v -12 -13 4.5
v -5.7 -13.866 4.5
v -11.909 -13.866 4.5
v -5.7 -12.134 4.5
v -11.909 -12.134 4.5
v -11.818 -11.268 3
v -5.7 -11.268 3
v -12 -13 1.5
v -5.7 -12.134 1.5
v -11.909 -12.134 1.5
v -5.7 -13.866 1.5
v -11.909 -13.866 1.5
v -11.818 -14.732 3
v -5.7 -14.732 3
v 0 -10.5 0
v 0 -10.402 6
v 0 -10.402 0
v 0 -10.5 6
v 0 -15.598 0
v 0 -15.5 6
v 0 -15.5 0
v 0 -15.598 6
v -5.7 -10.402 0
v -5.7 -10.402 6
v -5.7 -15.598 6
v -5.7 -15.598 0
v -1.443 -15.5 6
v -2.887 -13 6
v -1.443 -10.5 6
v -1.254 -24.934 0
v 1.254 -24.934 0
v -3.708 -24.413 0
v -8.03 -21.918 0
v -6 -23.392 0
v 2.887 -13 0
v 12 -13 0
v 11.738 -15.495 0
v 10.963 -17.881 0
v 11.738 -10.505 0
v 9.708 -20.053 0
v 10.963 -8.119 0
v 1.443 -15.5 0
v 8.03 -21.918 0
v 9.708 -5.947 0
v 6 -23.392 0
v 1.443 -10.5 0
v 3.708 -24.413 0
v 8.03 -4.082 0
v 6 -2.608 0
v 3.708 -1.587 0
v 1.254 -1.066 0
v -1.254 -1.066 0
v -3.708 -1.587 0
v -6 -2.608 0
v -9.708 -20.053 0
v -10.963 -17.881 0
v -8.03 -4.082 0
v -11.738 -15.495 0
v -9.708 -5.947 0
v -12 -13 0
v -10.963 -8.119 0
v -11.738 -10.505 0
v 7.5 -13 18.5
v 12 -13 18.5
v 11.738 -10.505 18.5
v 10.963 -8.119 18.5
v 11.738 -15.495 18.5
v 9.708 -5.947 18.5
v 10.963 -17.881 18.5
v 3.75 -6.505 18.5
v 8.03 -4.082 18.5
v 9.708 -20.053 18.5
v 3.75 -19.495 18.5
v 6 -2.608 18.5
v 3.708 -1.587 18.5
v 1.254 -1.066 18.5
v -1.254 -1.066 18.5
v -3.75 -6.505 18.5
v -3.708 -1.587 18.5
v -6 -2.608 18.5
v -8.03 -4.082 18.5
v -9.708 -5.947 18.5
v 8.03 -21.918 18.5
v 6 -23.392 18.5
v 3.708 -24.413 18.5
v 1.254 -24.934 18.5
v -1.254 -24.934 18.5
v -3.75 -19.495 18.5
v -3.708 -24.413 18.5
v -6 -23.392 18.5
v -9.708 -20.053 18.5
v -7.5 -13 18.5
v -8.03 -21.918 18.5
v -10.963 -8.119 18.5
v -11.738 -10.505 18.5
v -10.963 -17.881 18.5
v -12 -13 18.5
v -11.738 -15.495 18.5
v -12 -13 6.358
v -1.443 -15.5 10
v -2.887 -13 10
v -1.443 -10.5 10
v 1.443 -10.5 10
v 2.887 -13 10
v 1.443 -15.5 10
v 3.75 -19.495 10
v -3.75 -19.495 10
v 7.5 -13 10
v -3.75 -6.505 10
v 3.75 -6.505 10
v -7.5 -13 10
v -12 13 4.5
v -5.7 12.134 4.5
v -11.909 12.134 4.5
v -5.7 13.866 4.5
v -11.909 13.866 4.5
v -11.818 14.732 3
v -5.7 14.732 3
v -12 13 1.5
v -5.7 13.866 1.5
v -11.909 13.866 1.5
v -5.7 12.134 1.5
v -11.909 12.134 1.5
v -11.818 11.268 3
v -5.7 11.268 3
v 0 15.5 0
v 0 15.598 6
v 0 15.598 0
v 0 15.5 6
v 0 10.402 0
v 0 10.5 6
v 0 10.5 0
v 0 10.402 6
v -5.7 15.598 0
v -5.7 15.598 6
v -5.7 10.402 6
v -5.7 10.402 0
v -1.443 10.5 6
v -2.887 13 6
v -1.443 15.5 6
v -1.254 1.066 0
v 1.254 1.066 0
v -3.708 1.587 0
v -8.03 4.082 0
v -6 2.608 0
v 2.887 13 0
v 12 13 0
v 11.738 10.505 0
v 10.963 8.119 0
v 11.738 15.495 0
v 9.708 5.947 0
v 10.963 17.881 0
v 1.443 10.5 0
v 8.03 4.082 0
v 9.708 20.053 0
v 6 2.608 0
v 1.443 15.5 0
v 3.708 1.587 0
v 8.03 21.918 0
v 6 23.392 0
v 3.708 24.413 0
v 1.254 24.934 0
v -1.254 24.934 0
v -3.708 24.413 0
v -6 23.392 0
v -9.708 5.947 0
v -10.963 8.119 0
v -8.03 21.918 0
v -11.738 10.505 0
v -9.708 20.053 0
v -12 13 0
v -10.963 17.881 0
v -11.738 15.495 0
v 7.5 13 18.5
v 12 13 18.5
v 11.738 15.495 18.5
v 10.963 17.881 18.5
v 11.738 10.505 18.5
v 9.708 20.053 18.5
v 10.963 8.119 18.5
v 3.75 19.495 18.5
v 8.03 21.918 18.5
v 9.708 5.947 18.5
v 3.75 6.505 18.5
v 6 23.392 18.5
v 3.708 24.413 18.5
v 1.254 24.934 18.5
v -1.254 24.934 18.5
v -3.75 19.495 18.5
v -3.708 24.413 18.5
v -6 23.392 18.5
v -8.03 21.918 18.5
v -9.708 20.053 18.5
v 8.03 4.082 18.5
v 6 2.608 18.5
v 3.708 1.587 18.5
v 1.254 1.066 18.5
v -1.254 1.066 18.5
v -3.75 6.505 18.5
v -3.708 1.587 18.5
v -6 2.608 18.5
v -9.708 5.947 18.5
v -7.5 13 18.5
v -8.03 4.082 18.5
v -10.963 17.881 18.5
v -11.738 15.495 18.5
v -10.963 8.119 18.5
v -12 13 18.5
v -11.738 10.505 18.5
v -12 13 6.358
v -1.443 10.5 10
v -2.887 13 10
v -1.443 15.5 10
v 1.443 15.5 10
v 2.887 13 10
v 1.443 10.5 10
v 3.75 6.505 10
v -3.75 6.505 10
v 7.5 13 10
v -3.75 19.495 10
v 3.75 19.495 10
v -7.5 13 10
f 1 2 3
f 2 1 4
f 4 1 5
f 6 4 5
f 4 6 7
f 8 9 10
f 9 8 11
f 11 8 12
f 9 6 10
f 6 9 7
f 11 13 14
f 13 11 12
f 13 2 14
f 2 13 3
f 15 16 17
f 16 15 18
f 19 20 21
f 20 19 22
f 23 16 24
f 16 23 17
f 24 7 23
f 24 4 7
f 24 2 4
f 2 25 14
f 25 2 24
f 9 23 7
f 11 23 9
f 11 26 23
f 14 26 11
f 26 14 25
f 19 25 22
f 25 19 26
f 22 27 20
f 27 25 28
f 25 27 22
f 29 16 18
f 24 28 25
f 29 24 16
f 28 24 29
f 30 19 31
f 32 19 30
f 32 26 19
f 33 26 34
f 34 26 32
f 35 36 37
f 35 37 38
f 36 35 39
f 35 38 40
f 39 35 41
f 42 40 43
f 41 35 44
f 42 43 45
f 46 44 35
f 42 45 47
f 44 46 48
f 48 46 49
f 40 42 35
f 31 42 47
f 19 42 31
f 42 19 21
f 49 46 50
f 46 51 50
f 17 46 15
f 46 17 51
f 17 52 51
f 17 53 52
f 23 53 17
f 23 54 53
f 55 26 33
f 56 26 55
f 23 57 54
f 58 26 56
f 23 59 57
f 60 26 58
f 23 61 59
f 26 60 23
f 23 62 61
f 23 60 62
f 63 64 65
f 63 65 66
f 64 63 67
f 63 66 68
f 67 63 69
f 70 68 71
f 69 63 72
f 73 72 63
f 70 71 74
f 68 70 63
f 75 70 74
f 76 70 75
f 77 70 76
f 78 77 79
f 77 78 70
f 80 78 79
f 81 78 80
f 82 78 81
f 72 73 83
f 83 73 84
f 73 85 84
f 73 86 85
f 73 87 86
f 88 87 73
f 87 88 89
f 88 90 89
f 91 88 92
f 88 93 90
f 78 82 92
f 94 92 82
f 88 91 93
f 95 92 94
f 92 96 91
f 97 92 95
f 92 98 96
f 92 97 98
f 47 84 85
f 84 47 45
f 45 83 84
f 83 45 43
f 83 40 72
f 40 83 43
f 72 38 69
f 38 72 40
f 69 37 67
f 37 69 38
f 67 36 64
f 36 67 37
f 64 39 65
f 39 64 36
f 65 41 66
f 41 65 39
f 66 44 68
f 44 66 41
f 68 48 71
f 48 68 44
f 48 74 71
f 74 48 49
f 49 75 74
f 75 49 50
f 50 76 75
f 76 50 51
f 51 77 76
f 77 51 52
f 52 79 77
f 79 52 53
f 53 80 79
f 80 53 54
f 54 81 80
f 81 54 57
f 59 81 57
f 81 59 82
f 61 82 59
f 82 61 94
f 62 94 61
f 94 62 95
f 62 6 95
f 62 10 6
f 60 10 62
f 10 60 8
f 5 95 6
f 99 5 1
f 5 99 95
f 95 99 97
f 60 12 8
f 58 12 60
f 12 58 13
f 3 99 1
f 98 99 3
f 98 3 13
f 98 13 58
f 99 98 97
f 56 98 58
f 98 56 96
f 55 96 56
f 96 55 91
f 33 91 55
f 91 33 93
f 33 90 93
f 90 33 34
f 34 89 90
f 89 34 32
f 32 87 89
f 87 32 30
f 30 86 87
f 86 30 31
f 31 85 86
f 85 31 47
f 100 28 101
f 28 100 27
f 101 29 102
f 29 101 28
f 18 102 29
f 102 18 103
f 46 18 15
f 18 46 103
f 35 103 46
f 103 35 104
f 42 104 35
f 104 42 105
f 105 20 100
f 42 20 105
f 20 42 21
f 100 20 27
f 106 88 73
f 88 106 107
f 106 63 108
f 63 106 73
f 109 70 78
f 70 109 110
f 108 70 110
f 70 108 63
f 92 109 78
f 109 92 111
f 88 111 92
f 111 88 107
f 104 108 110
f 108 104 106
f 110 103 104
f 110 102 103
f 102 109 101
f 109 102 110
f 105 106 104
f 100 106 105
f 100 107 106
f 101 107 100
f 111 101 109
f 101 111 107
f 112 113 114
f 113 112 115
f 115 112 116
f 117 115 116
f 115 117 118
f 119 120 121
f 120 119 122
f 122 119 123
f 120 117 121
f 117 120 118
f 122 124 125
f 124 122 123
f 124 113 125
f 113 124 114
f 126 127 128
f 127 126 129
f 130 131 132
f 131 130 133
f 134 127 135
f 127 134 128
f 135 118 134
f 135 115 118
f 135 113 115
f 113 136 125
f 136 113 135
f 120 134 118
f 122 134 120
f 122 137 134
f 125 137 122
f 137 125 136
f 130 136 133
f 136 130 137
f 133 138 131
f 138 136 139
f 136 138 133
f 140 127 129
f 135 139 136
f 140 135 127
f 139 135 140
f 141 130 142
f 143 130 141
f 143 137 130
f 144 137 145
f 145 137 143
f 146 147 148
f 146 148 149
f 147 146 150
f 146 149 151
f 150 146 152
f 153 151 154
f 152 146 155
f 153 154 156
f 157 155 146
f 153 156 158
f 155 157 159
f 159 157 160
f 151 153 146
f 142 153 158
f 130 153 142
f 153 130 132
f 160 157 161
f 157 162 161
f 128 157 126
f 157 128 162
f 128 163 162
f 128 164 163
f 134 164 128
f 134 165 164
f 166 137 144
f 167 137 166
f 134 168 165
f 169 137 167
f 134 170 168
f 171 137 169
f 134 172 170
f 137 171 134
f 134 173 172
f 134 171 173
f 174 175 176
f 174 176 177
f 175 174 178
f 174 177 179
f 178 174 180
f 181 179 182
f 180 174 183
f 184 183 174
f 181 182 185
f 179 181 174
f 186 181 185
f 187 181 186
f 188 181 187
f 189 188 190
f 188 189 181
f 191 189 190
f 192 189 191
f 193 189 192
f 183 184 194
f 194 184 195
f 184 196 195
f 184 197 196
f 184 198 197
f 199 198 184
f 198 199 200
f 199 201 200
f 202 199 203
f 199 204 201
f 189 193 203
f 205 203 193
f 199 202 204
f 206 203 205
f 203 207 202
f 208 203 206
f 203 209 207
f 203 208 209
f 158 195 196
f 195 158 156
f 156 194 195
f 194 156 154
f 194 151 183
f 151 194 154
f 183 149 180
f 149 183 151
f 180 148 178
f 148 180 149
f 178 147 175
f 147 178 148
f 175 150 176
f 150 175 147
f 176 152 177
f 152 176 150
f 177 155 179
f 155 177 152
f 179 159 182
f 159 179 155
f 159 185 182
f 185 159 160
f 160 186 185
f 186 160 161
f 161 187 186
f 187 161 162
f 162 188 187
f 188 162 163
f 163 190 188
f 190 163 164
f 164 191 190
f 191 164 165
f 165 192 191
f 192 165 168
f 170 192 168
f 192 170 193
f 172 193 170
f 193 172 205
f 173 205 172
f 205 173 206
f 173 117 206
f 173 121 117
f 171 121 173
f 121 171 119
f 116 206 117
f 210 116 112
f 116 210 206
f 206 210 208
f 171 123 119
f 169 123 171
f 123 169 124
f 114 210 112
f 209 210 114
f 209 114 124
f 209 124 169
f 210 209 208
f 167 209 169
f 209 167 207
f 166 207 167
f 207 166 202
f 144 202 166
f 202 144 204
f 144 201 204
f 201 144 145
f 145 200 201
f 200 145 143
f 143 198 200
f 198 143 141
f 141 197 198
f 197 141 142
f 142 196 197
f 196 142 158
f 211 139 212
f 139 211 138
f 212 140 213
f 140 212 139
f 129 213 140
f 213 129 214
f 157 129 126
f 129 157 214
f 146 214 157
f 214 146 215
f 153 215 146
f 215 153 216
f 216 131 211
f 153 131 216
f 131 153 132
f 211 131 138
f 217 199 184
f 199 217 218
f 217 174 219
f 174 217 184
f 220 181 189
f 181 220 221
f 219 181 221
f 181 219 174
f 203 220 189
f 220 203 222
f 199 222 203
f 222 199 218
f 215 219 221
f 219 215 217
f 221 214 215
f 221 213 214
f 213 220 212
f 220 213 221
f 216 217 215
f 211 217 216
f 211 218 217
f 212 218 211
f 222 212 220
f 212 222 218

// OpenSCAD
// file: base_end_2off.scad
include <settings.scad>;

!base_end();

module base_end() difference() {
	linear_extrude(height = end_height, convexity = 5) difference() {
		square([yz_motor_distance + motor_casing - motor_screw_spacing + 10, motor_casing + rod_size * 4], center = true);
		for(end = [1, -1]) {
			for(side = [1, -1]) translate([end * (yz_motor_distance + motor_casing - motor_screw_spacing) / 2, side * motor_screw_spacing / 2, 0]) circle(m3_size * da6, $fn = 6);
			translate([end * (yz_motor_distance + motor_casing) / 2, 0, 0]) circle(motor_screw_spacing / 2);
		}
	}
	for(end = [1, -1]) translate([end * (yz_motor_distance + motor_casing) / 2, 0, 3]) linear_extrude(height = end_height, convexity = 5) square(motor_casing, center = true);
	for(side = [1, -1]) translate([0, side * (motor_casing / 2 + rod_size), rod_size / 2 + bearing_size / 2]) rotate([90, 180 / 8, 90]) {
		cylinder(r = rod_size * da8, h = yz_motor_distance + motor_casing + 20, center = true, $fn = 8);
		%translate([0, 0, -70]) cylinder(r = rod_size * da8, h = 200, center = true, $fn = 8);
	}
	translate([0, 0, end_height]) scale([1, 1, .5]) rotate([90, 0, 90]) cylinder(r = motor_casing / 2, h = yz_motor_distance + 20, center = true);
	translate([yz_motor_distance / 2 - rod_size, 0, 0]) {
		translate([0, 0, -3]) linear_extrude(height = end_height - motor_casing / 4, convexity = 5) {
			rotate(180 / 8) circle(rod_size * da8, $fn = 8);
			translate([0, -rod_size / 4, 0]) square([rod_size * .6, rod_size / 2]);
		}
		// z axis clamping
		for(h = [8, end_height - motor_casing / 4 - 8]) translate([0, 0, h]) rotate([90, 0, 90]) {
			cylinder(r = m3_size * da6, h = yz_motor_distance + motor_casing, center = true, $fn = 6);
			translate([0, 0, -rod_size / 2 - 3]) cylinder(r = m3_nut_size* da6, h = yz_motor_distance + motor_casing, $fn = 6);
			translate([0, 0, 0]) cylinder(r = m3_nut_size / 2 + 0.5, h = yz_motor_distance + motor_casing, $fn = 6);
			translate([0, 0, -rod_size / 2 - 8]) rotate([0, 180, 0]) cylinder(r = m3_size * da6 * 2, h = yz_motor_distance + motor_casing, $fn = 6);
		}
	}
	translate([-yz_motor_distance / 2 + bearing_size / 2, 0, -bearing_size * sqrt(2) / 4]) rotate([90, -45, 0]) {
		%cylinder(r = rod_size * da8, h = 100, center = true, $fn = 8);
		for(side = [0, 1]) mirror([0, 0, side]) translate([0, 0, rod_size / 2 + 2]) {
			cylinder(r = bearing_size / 2, h = bearing_length, center = false, $fn = 80);
			cube([bearing_size / 2, bearing_size / 2, bearing_length]);
		}
	}
	translate([0, 0, end_height - rod_size * 1.5]) rotate([90, 180 / 8, 0]) cylinder(r = rod_size * da8, h = motor_casing + rod_size * 5, $fn = 8, center = true);
	%translate([0, 0, end_height - rod_size * 1.5]) rotate([90, 180 / 8, 0]) cylinder(r = rod_size * da8, h = 100, $fn = 8, center = true);
}
// file: y_bearing_retainers.scad
include <settings.scad>;

!for(b = [0:1]) mirror([0, b, 0]) for(a = [-1,1]) translate([a * bearing_size / 4, bearing_size - (bearing_size * 2/3) * a, 0]) rotate(90 + 90 * a) y_bearing_retainer();

module y_bearing_retainer() intersection() {
	difference() {
		linear_extrude(height = 10, convexity = 5) difference() {
			union() {
				intersection() {
					translate([-yz_motor_distance / 2 + bearing_size / 2, 0, 0]) circle(bearing_size / 2 + 4);
					translate([-yz_motor_distance / 2 + bearing_size / 2 - bearing_size / 2 - 4, -bearing_size, 0]) square([bearing_size + 8, bearing_size]);
				}
				translate([-yz_motor_distance / 2 + bearing_size / 2 - bearing_size / 2 - 4, 0, 0]) square([bearing_size + 8, bearing_size * sqrt(2) / 4 - 1]);
				translate([0, bearing_size * sqrt(2) / 4 - 3, 0]) square([yz_motor_distance + motor_casing - motor_screw_spacing + 10, 4], center = true);
			}
			translate([-yz_motor_distance / 2 + bearing_size / 2, 0, 0]) circle(bearing_size / 2);
			translate([-yz_motor_distance / 2 + bearing_size / 2 - bearing_size / 2, 0, 0]) square(bearing_size);
		}
		//screw holes
		for(side = [1, -1]) translate([side * (yz_motor_distance + motor_casing - motor_screw_spacing) / 2, 0, 5]) rotate(90) rotate([90, 0, 90]) {
			cylinder(r = m3_size * da6, h = bearing_size, center = true, $fn = 6);
			translate([0, 0, bearing_size * sqrt(2) / 4 - 5]) rotate([180, 0, 0]) cylinder(r = m3_size, h = bearing_size, $fn = 30);
		}
	}
	translate([0, 0, 5]) rotate(90) rotate([90, 0, 90]) cylinder(r = (yz_motor_distance + motor_casing - motor_screw_spacing + 10) / 2, h = bearing_size + 10, center = true, $fn = 6);
}
// file: bed_mounts.scad
include <settings.scad>;

!for(b = [0:1]) mirror([0, b, 0]) for(a = [-1,1]) translate([a * -7.5, 18 - 5 * a, 0]) rotate(180 + 90 * a) bed_mount();

module bed_mount() difference() {
	linear_extrude(height = 10, convexity = 5) difference() {
		union() {
			rotate(180 / 8) circle((rod_size + 8) * da8, $fn = 8);
			translate([0, -rod_size / 2 - 4, 0]) square([rod_size / 2 + 8, max(rod_size + 8, rod_size / 2 + 4 + bed_mount_height)]);
		}
		rotate(180 / 8) circle(rod_size * da8, $fn = 8);
		translate([0, -rod_size / (1 + sqrt(2)) / 2, 0]) square([rod_size + 10, rod_size / (1 + sqrt(2))]);
	}
	translate([rod_size / 2 + 1.5, -rod_size / 2 - 6, 5]) rotate([-90, 0, 0]) {
		cylinder(r = m3_size * da6, h = max(rod_size + 12, rod_size / 2 + 7 + bed_mount_height, $fn = 6));
		cylinder(r = m3_nut_size * da6, h = 4, $fn = 6);
	}
}
// file: x_end_left.scad
include <settings.scad>;

!x_end(0);

module x_end(motor = 0) mirror([(motor == 0) ? 1 : 0, 0, 0]) difference() {
	union() {
		if(motor > 0) translate([-(motor_casing / 2 + rod_size + bearing_size + 8) / 2 - motor_casing, 8 + rod_size, 0]) rotate([90, 0, 0]) {
			// Motor holder
			linear_extrude(height = 7) difference() {
				square([motor_casing + 3, x_rod_spacing + 8 + rod_size]);
				translate([motor_casing / 2, (x_rod_spacing + 8 + rod_size) / 2, 0]) {
					circle(motor_screw_spacing / 2);
					for(x = [1, -1]) for(y = [1, -1]) translate([x * motor_screw_spacing / 2, y * motor_screw_spacing / 2, 0]) circle(m3_size * da6, $fn = 6);
					translate([-(motor_casing * 1.5 - motor_screw_spacing), (motor > 1) ? (motor_casing / 2 - motor_screw_spacing) : 0, 0]) square([motor_casing, x_rod_spacing + 8 + rod_size]);
				}
			}
			// Belt
			%translate([motor_casing / 2, (x_rod_spacing + 8 + rod_size) / 2, rod_size / 2 - 2 - bearing_size / 2 - 2 - idler_pulley_width / 2]) rotate([180, 0, 0]) linear_extrude(height = 5, convexity = 5) difference() {
				union() {
					circle(pulley_size / 2 + 2);
					translate([0, -pulley_size / 2 - 2, 0]) square([200.5, pulley_size + 4]);
					translate([200.5, 0, 0]) circle(pulley_size / 2 + 2);
				}
				circle(pulley_size / 2);
				translate([0, -pulley_size / 2, 0]) square([200.5, pulley_size]);
				translate([200.5, 0, 0]) circle(pulley_size / 2);
			}

		}
		linear_extrude(height = x_rod_spacing + 8 + rod_size, convexity = 5) difference() {
			union() {
				for(side = [1, -1]) translate([side * (motor_casing / 4 + rod_size / 2), 0, 0]) circle(bearing_size / 2 + 3, $fn = 30);
				square([motor_casing / 2 + rod_size, bearing_size / 2 + 3], center = true);
				translate([-(motor_casing / 2 + rod_size + bearing_size + 6) / 2, 0, 0]) square([(motor_casing / 2 + rod_size + bearing_size / 2 + 3 + 3) / 2, bearing_size / 2 + 4 + rod_size / 2]);
				translate([-(motor_casing / 2 + rod_size + bearing_size + 6) / 2, 0, 0]) square([motor_casing / 2 + rod_size + bearing_size / 2 + 3 + 3, bearing_size / 2 + 3 + rod_size / 2]);
				translate([-(motor_casing / 2 + rod_size + bearing_size + 6) / 2 + rod_size / 2 + 2, 0, 0]) square([(motor_casing / 2 + rod_size + bearing_size + 6) / 2 + 5 - rod_size / 2 - 2, bearing_size / 2 + 6 + rod_size]);
				translate([-(motor_casing / 2 + rod_size + bearing_size + 6) / 2 + rod_size / 2 + 2, bearing_size / 2 + rod_size / 2 + 4, 0]) circle(rod_size / 2 + 2);
				translate([0, bearing_size / 2 + rod_size + 6, 0]) square(10, center = true);
			}
			square([motor_casing / 2 + rod_size, 3], center = true);
			translate([(motor_casing / 4 + rod_size / 2), 0, 0]) circle(bearing_size / 2 - .5, $fn = 30);
			translate([-(motor_casing / 4 + rod_size / 2), 0, 0]) circle(rod_nut_size * 6/14, $fn = 6);
			translate([4 + rod_size / 2, bearing_size / 2 + rod_size / 2 + 3, 0]) {
				square([motor_casing / 2 + rod_size + bearing_size + 8, rod_size / 2], center = true);
				translate([-(motor_casing / 2 + rod_size + bearing_size + 8) / 2, .5, 0]) circle(rod_size / 4 + .5, $fn = 12);
			}
		}
	}
	translate([0, 0, (x_rod_spacing + rod_size + 8) / 2]) {
		for(end = [0, 1]) mirror([0, 0, end]) translate([motor_casing / 4 + rod_size / 2, 0, -(x_rod_spacing + rod_size + 8) / 2 - 1]) cylinder(r = bearing_size / 2 - .05, h = bearing_length, $fn = 30);
		for(side = [1, -1]) render(convexity = 5) translate([0, bearing_size / 2 + rod_size / 2 + 3, side * x_rod_spacing / 2]) rotate([0, 90, 0]) {
			//cylinder(r = rod_size / 2, h = motor_casing / 2 + rod_size + bearing_size + 10, center = true, $fn = 30);
			difference() {
				translate([0, 0, (motor > -1) ? rod_size / 2 + 2 : 0]) intersection() {
					rotate(45) cube([rod_size + 2, rod_size + 2, motor_casing / 2 + rod_size + bearing_size + 10], center = true);
					cube([rod_size * 2, rod_size + 2, motor_casing / 2 + rod_size + bearing_size + 10], center = true);
				}
				translate([0, rod_size, 0]) cube([rod_size * 2, rod_size * 2, 6], center = true);
				for(end = [1, -1]) translate([0, -rod_size, end * (motor_casing / 4 + rod_size / 2)]) cube([rod_size * 2, rod_size * 2, 6], center = true);
			}
			translate([0, 0, rod_size / 2 + 2]) intersection() {
				rotate(45) cube([rod_size, rod_size, motor_casing / 2 + rod_size + bearing_size + 10], center = true);
				cube([rod_size * 2, rod_size + 1, motor_casing / 2 + rod_size + bearing_size + 10], center = true);
			}
		}
		// holes for clamping screws
		rotate([90, 0, 0]) {
			cylinder(r = m3_size * da6, h = 100, center = true, $fn = 6);
			translate([0, 0, bearing_size / 4 + .5]) cylinder(r = m3_nut_size * da6, h = 100, center = false, $fn = 6);
		}
	}
	translate([-(motor_casing / 4 + rod_size / 2), 0, 5]) rotate(90) cylinder(r = rod_nut_size / 2, h = x_rod_spacing + 8 + rod_size, $fn = 6);
	translate([(motor_casing / 4 + rod_size / 2), 0, 5]) %rotate(180 / 8) cylinder(r = rod_size * da8, h = 200, center = true, $fn = 8);
}
// file: x_carriage.scad
include <settings.scad>;

!x_carriage();

module x_carriage() difference() {
	intersection() {
		linear_extrude(height = x_carriage_width, convexity = 5) difference() {
			union() {
				square([bearing_size + 8, x_rod_spacing], center = true);
				translate([0, -x_rod_spacing / 2 - bearing_size / 2 - 4, 0]) square([bearing_size / 2 + 4 + 15, x_rod_spacing / 2 + bearing_size / 2 + 4 - 2 - pulley_size / 2]);
				translate([0, -pulley_size / 2, 0]) {
					square([bearing_size / 2 + 4 + 15, 8]);
					translate([bearing_size / 2 + 4 + 15, 4, 0]) circle(4);
				}
				rotate(180) translate([0, -x_rod_spacing / 2 - bearing_size / 2 - 4, 0]) square([bearing_size / 2 + 4 + 28, bearing_size / 2 + 4 + 3]);
				for(side = [1, -1]) translate([0, side * x_rod_spacing / 2, 0]) circle(bearing_size / 2 + 4, $fn = 30);
			}
			translate([bearing_size / 2 + 4, 2 - pulley_size / 2, 0]) {
				square([15, 4]);
				translate([0, -3, 0]) square([2, 4]);
				translate([15, 2, 0]) circle(2);
			}
			for(side = [1, -1]) translate([0, side * x_rod_spacing / 2, 0]) {
				circle(bearing_size / 2 -1, $fn = 30);
				rotate(90 * side) square([2, bearing_size / 2 + 40]);
			}
		}
		difference() {
			rotate([0, -90, 0]) linear_extrude(height = bearing_size + 100, convexity = 5, center = true) difference() {
				polygon([
					[
						0,
						(x_rod_spacing / 2 + bearing_size / 2 + 4)
					],[
						0,
						-(x_rod_spacing / 2 + bearing_size / 2 + 4)
					],[
						bearing_length + 4,
						-(x_rod_spacing / 2 + bearing_size / 2 + 4)
					],[
						bearing_length + 4,
						-(x_rod_spacing / 2 - bearing_size / 2 - 4)
					],[
						x_carriage_width,
						(x_rod_spacing / 2 - bearing_size / 2 - 4)
					],[
						x_carriage_width,
						(x_rod_spacing / 2 + bearing_size / 2 + 4)
					]
				]);
			}
			translate([bearing_size / 2 + 4, -50, bearing_length + 4]) cube(100);
		}
	}
	// linear bearings
	translate([0, x_rod_spacing / 2, 0]) rotate([0, 0, 0]) {
		%translate([0, 0, 20]) rotate(180 / 8) cylinder(r = rod_size * da8, h = 200, center = true, $fn = 8);
		for(end = [0, 1]) mirror([0, 0, end]) translate([0, 0, end * -x_carriage_width - 1]) cylinder(r = bearing_size / 2, h = bearing_length, $fn = 30);
	}
	translate([0, -x_rod_spacing / 2, 0]) rotate([0, 0, 0]) {
		translate([0, 0, 4]) cylinder(r = bearing_size / 2, h = x_carriage_width + 1, center = false, $fn = 30);
		%translate([0, 0,20]) rotate(180 / 8) cylinder(r = rod_size * da8, h = 200, center = true, $fn = 8);
	}
	// screw holes
	translate([bearing_size / 2 + 4 + 10, 5 - pulley_size / 2, bearing_length / 2 + 2]) rotate([90, 0, 0]) {
		cylinder(r = m3_size * da6, h = x_rod_spacing + bearing_size + 10, center = true, $fn = 6);
		rotate([180, 0, 0]) cylinder(r = m3_size * da6 * 2, h = x_rod_spacing + bearing_size + 10, center = false, $fn = 6);
		translate([0, 0, x_rod_spacing / 2 + bearing_size / 2 + 6 - pulley_size / 2]) cylinder(r = m3_nut_size * da6, h = x_rod_spacing + bearing_size + 10, center = false, $fn = 6);
	}
	//#for(side = [1, -1]) translate([-bearing_size / 2 - 4 - 14, 0, x_carriage_width / 2 + carriage_extruder_offset + side * 25]) rotate([90, 0, 0]) cylinder(r = 4.1, h = x_rod_spacing - 10, center = true, $fn = 6);
	translate([-bearing_size / 2 - 4 - 14, 0, x_carriage_width / 2 + carriage_extruder_offset]) rotate([90, 0, 0]) linear_extrude(height = bearing_size + x_rod_spacing + 10, center = true, convexity = 5) {
		*translate([-14, 0, 0]) {
			circle(20);
			rotate(45) square(5);
		}
		intersection() {
			translate([18, 0, 0]) rotate(135) square(100);
			translate([-14, 0, 0]) square([56, 100], center = true);
		}
		for(side = [1, -1]) translate([0, side * 25, 0]) circle(m4_size * da6, $fn = 6);
	}
}
// file: y_idler.scad
include <wallace.scad>;

!y_idler();

module y_idler() difference() {
	linear_extrude(height = 10, convexity = 5) difference() {
		union() {
			square([rod_size * 2, motor_casing + rod_size * 2], center = true);
			for(side = [1, -1]) translate([0, side * (motor_casing / 2 + rod_size), rod_size / 2 + bearing_size / 2]) rotate(180 / 8) circle(rod_size * 13/12, h = yz_motor_distance + motor_casing + 20, center = true, $fn = 8);
		}
		for(side = [1, -1]) translate([0, side * (motor_casing / 2 + rod_size), rod_size / 2 + bearing_size / 2]) rotate(180 / 8) circle(rod_size * da8, h = yz_motor_distance + motor_casing + 20, center = true, $fn = 8);

	}
	rotate([90, 0, 90]) {
		for(side = [1, -1]) translate([side * (motor_casing / 2 - rod_size / 2), 5, -3]) {
			cylinder(r = m3_size * da6, h = rod_size * 2, center = true, $fn = 6);
			translate([0, 0, rod_size]) cylinder(r = m3_nut_size * da6, h = 4, $fn = 6);
		}
		//belt
		%translate([0, 5, -rod_size - idler_pulley_width / 2]) linear_extrude(height = 5, center = true, convexity = 5) for(side = [1, 0]) mirror([side, 0, 0]) {
			translate([-(motor_casing / 2 - rod_size / 2), 0, 0]) {
				intersection() {
					difference() {
						circle(pulley_size / 2 + 2);
						circle(pulley_size / 2);
					}
					square(pulley_size);
				}
				rotate(90) difference() {
					translate([2, 0, 0]) square([pulley_size / 2, 40]);
					square([pulley_size / 2, 40]);
				}
				rotate(-90) difference() {
					translate([0, 2, 0]) square([60 - yz_motor_distance / 2 - motor_screw_spacing / 2, pulley_size / 2]);
					square([60, pulley_size / 2]);
				}
			}
			translate([0, -(60 - yz_motor_distance / 2 - motor_screw_spacing / 2), 0]) difference() {
				circle(motor_casing / 2 - rod_size / 2 - pulley_size / 2);
				circle(motor_casing / 2 - rod_size / 2 - pulley_size / 2 - 2);
				translate([-(motor_casing / 2 - rod_size / 2 - pulley_size / 2), 0, 0]) square(motor_casing - rod_size - pulley_size);
			}
		}
	}
}
// file: idler_pulleys.scad
include <wallace.scad>;

!for(x = [1, -1]) for(y = [1, -1]) translate([x * (pulley_size / 2 + 3), y * (pulley_size / 2 + 3), 0]) idler_pulley(true);

module idler_pulley(double_bearing = true) difference() {
	intersection() {
		linear_extrude(height = idler_pulley_width + 1, convexity = 5) difference() {
			circle(pulley_size / 2 + 2);
			circle(5, $fn = 4);
		}
		union() {
			translate([0, 0, idler_pulley_width / 2 + 1]) scale([1, 1, 1.25]) sphere(pulley_size / 2);
			cylinder(r = pulley_size / 2 + 5, h = 1);
		}
	}
	for(h = [-idler_pulley_width + 4, idler_pulley_width * 2 + 1 - 4]) rotate(180 / 8) translate([0, 0, (double_bearing) ? h:0]) cylinder(r = 10 * da8, h = idler_pulley_width * 2, center = true, $fn = 8);
}
// file: feet.scad
include <settings.scad>;

!for(x = [1, -1]) for(y = [1, -1]) translate([x * (rod_size * 1.5 + 2), y * (rod_size * 1.5 + 2), 0]) foot();

module foot() difference() {
	linear_extrude(height = rod_size, convexity = 5) difference() {
		minkowski() {
			square(rod_size + 2, center = true);
			circle(rod_size, $fn = 16);
		}
		circle(rod_size / 2, $fn = 12);
	}
	translate([0, 0, -rod_size / 16]) cylinder(r1 = rod_size * 3/4, r2 = rod_size / 4, h = rod_size / 2, $fn = 12);
	translate([0, 0, rod_size / 2 + rod_size / 16]) cylinder(r2 = rod_size * 3/4, r1 = rod_size / 4, h = rod_size / 2, $fn = 12);
}
// file: z_top_clamps.scad
include <settings.scad>;

!for(side = [0, 1]) mirror([side, 0, 0]) translate([-rod_size * 2.5, 0, 0]) z_top_clamp();

module z_top_clamp() difference() {
	union() {
		linear_extrude(height = rod_size * 2 + gusset_size, convexity = 5) difference() {
			union() {
				circle(r = rod_size * da6 * 2, $fn = 6);
				translate([0, -rod_size, 0]) square([rod_size * (1 + da6), rod_size * 2]);
				translate([rod_size - rod_size * da6, rod_size / 2, rod_size]) square([rod_size * da6 * 2, rod_size / 2 + gusset_size]);
			}
		}
		translate([rod_size, -rod_size - 1, rod_size]) rotate([-90, 0, 0]) cylinder(r = rod_size / cos(180 / 6), h = rod_size * 2 + gusset_size + 2, $fn = 6);
	}
	translate([rod_size, -rod_size - 2, rod_size]) rotate([-90, 0, 0]) cylinder(r = rod_size * da6, h = gusset_size + rod_size * 2 + 4, $fn = 6);
	translate([rod_size, rod_size + gusset_size, rod_size * 2 + gusset_size]) rotate([45, 0, 0]) cube([rod_size * 2, gusset_size * sqrt(2), gusset_size * sqrt(2)], center = true);
	translate([0, 0, -1]) linear_extrude(height = rod_size * 2 + gusset_size + 2, convexity = 5) {
		circle(r = rod_size * da6, $fn = 6);
		%translate([rod_size, -10, rod_size * da6 * 2]) rotate([-90, 0, 0]) cylinder(r = rod_size * da6, h = 160, $fn = 6);
		translate([0, -rod_size / 2, 0]) square([gusset_size + rod_size * 2 + 1, rod_size]);
	}
}
// file: settings.scad
rod_size = 8;
rod_nut_size = 15; //12 for M6, 15 for M8
bearing_size = 15.5; //12.5 for LM6UU, 15.5 for LM8UU,LM8SUU
bearing_length = 24.5; //19.5 for LM6UU, 17.5 for LM8SUU, 24.5 for LM8UU
yz_motor_distance = 25;
motor_screw_spacing = 26; //26 for NEMA14, 31 for NEMA17
motor_casing = 38; //38 for NEMA14, 45 for NEMA17
end_height = 40; //measure the height of your motor casing and add 4mm. Suggestion: 40 for NEMA14, 55 for NEMA17
bed_mount_height = 16;
//x_rod_spacing = motor_screw_spacing + 3 + rod_size;
x_rod_spacing = 30;
x_carriage_width = 70;
carriage_extruder_offset = 5;
pulley_size = 20;
idler_pulley_width = 10;
gusset_size = 15;
m3_size = 3;
m3_nut_size = 6;
m4_size = 4;
motor_shaft_size = 5;

// ratio for converting diameter to apothem
da6 = 1 / cos(180 / 6) / 2;
da8 = 1 / cos(180 / 8) / 2;
// file: wallace.scad
include <settings.scad>;

//modules
use <z_top_clamps.scad>;
use <feet.scad>;
use <idler_pulleys.scad>;
use <y_idler.scad>;
use <leadscrew_couplers.scad>;
use <x_carriage.scad>;
use <x_end_left.scad>;
//use <x_end_right.scad>;
use <bed_mounts.scad>;
use <y_bearing_retainers.scad>;
use <base_end_2off.scad>;


//The following section positions parts for rendering the assembled machine.

	translate([0, 0, -bearing_size]) rotate([0, 180, 0]) base_end();
	for(end = [1, -1]) translate([0, end * motor_screw_spacing / 2 + 5, -bearing_size + bearing_size * sqrt(2) / 4]) rotate([-90, 0, 180]) y_bearing_retainer();
	for(side = [0, 1]) mirror([0, side, 0]) translate([yz_motor_distance / 2 - bearing_size / 2, -motor_casing / 2 - rod_size * 2 - 10, -bearing_size + bearing_size * sqrt(2) / 4]) rotate([90, 0, 0]) bed_mount();
	translate([-yz_motor_distance / 2 + rod_size - motor_casing / 4 - rod_size / 2, 0, 60 + (x_rod_spacing + 8 + rod_size) / 2]) rotate([0, 180, 0]) x_end(0);
	translate([140, 0, 60 + (x_rod_spacing + 8 + rod_size) / 2]) rotate([0, 180, 0]) {
		x_end(2);
		translate([0, 8 + rod_size, 0]) rotate([90, 0, 0]) translate([0, (x_rod_spacing + 8 + rod_size) / 2, rod_size / 2 - 2 - bearing_size / 2 - 4 - idler_pulley_width - 1.5]) idler_pulley(true);
	}
	translate([40, rod_size + bearing_size / 2 + 1 - rod_size / 2 + 2, 60]) {
		rotate([90, 0, 90]) x_carriage();
		translate([x_carriage_width / 2 + carriage_extruder_offset, -14 - bearing_size / 2 - 4, x_rod_spacing / 2 + bearing_size / 2 + 4]) {
			rotate([90, 0, 180]) translate([10.57, 30.3, -14]) import("gregs/gregs_accessible_wade-wildseyed_mount.stl", convexity = 5);
			%rotate(180 / 8) cylinder(r = 2, h = 150, center = true, $fn = 8);
		}
	}
	translate([-yz_motor_distance / 2 - motor_casing / 2, 0, -bearing_size / 2]) leadscrew_coupler();
	translate([60, 0, -bearing_size - rod_size / 2 - bearing_size / 2]) {
		rotate([0, 90, 0]) y_idler();
		for(side = [1, -1]) translate([5, side * (motor_casing / 2 - rod_size / 2), idler_pulley_width + 1.5 + rod_size]) rotate([180, 0, 0]) idler_pulley(true);
	}
	for(side = [0, 1]) mirror([0, side, 0]) translate([0, -motor_casing / 2 - rod_size * 2 - 10, -bearing_size - end_height + rod_size * 1.5]) rotate([90, 0, 0]) foot();
	translate([-yz_motor_distance / 2 + rod_size, 0, 210 - end_height]) rotate([180, 0, 90]) z_top_clamp(0);
// main file
include <wallace.scad>;

!for(side = [-1,1]) translate([0, side * motor_screw_spacing / 2, 0]) leadscrew_coupler();

module leadscrew_coupler() difference() {
	linear_extrude(height = 10 + rod_nut_size / 2 + 1, convexity = 5) difference() {
		circle(motor_screw_spacing / 2 - 1);
		circle(motor_shaft_size * da6, $fn = 6);
	}
	translate([0, 0, m3_nut_size / 2]) rotate([-90, 0, 90]) {
		cylinder(r = m3_size * da6, h = motor_screw_spacing / 2 + 1);
		%rotate(90) cylinder(r = m3_nut_size / 2, h = 5.5, $fn = 6);
		translate([0, 0, 12]) cylinder(r = m3_size * da6 * 2, h = motor_screw_spacing / 2);
		translate([-m3_nut_size / da6 / 4, -m3_nut_size / 2, 0]) cube([m3_nut_size / da6 / 2, m3_nut_size + 1, 5.7]);
	}
	translate([0, 0, 10]) cylinder(r = rod_nut_size / 2, h = rod_nut_size + 1, $fn = 6);
	//translate([0, 0, -1]) cube(100);
}
